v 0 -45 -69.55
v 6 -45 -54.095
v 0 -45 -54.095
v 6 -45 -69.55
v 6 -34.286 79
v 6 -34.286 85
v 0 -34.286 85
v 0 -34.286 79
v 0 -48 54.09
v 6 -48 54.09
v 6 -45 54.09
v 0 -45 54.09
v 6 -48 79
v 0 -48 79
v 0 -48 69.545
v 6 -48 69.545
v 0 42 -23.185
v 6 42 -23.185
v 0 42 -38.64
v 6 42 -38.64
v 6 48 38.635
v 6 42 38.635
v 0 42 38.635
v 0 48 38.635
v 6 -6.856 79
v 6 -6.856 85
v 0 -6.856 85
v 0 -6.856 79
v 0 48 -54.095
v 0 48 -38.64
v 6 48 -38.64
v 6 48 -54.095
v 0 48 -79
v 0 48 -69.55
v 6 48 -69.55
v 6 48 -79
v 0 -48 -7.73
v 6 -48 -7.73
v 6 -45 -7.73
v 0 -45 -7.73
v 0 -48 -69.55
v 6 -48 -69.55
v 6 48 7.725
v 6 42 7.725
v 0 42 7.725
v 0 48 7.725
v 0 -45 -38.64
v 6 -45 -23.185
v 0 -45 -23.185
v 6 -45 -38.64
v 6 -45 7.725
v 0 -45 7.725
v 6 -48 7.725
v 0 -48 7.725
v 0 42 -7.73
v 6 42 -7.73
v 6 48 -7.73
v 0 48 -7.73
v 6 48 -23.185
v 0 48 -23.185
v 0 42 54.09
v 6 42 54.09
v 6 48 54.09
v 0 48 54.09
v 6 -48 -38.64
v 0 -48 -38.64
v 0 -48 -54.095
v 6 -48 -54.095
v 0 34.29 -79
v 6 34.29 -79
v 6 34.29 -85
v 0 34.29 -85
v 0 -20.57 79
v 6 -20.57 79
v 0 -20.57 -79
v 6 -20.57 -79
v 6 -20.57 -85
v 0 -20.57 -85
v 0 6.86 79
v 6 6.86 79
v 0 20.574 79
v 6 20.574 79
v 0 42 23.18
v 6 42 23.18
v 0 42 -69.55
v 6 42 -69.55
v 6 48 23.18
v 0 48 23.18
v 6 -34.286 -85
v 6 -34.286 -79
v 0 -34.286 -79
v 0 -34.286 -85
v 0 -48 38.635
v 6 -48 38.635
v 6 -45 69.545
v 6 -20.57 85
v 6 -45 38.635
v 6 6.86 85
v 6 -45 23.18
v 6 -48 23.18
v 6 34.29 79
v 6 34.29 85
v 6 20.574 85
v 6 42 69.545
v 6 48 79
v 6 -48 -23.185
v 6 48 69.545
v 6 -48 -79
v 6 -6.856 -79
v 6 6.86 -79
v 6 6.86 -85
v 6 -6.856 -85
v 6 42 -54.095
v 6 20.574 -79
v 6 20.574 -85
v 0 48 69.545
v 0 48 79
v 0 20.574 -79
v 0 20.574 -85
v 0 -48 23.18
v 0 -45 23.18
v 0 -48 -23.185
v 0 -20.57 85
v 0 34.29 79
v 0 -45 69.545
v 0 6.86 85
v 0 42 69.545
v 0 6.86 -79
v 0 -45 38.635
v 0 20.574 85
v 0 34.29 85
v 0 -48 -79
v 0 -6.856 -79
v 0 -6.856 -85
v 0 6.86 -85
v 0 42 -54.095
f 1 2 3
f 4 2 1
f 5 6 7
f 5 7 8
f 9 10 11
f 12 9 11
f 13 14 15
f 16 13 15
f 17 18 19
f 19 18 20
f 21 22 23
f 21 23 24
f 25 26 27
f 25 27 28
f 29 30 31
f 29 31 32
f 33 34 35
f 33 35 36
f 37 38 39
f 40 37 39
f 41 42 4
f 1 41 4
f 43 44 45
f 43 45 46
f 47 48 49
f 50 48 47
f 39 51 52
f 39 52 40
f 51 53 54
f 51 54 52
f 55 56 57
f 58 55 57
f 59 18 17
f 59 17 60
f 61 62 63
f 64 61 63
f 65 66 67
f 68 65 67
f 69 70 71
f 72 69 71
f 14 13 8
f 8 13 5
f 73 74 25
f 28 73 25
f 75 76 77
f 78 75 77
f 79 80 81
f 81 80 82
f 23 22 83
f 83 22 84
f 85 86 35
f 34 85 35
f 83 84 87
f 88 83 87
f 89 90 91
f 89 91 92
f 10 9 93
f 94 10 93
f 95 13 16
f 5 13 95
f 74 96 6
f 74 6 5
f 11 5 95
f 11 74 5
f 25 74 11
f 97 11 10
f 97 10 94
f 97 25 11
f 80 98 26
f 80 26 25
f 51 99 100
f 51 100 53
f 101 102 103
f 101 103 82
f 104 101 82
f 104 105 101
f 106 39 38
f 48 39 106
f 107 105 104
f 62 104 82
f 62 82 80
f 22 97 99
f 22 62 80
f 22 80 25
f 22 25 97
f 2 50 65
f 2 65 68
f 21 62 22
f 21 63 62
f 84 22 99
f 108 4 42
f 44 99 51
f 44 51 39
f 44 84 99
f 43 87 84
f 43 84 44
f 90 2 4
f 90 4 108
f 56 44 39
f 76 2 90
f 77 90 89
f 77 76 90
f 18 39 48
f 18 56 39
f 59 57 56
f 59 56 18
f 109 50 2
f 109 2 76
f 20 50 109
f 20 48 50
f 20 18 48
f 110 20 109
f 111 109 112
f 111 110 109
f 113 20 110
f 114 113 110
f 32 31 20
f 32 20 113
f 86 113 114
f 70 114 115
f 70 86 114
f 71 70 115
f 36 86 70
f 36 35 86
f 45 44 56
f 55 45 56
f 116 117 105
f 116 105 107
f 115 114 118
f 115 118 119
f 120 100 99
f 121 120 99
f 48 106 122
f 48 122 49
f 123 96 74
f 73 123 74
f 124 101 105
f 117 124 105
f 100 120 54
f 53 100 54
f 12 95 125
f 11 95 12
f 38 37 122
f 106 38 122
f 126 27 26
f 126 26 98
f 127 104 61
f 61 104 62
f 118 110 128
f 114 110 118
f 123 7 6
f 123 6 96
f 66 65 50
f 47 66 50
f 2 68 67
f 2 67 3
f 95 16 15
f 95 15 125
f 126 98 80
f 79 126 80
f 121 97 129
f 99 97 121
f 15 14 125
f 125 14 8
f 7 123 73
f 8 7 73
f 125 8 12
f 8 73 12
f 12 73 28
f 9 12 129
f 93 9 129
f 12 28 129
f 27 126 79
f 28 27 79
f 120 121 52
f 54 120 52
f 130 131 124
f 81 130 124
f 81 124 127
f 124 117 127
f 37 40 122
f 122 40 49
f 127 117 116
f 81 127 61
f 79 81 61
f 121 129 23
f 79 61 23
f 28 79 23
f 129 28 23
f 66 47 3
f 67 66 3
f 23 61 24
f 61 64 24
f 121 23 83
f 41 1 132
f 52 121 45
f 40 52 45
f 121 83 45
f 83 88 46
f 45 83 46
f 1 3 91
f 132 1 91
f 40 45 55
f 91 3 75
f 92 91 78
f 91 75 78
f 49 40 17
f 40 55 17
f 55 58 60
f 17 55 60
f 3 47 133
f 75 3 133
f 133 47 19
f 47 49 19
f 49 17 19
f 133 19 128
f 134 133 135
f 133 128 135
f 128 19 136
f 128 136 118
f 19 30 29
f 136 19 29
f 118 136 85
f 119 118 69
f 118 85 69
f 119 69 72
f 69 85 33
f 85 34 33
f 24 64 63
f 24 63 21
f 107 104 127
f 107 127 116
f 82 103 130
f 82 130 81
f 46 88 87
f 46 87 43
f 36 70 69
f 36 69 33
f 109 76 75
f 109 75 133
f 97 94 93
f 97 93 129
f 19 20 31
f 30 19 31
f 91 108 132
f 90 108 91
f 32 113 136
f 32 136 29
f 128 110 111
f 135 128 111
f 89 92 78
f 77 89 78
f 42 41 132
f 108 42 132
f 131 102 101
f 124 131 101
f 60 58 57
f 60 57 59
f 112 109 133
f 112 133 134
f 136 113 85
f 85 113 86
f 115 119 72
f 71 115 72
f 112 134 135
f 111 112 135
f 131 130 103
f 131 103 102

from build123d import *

# Parameters (mm, degrees)
ESBO_O1_W                = 170
ESBO_O1_H                = 96
RESSALTO_EXTRUS_O1_DEPTH = 6
CORTE_EXTRUS_O1_REACH    = 99.801
ESBO_O2_W                = 15.455454545
ESBO_O2_H                = 6
CORTE_EXTRUS_O2_REACH    = 99.801
ESBO_O3_W                = 6
ESBO_O3_H                = 13.714285714


with BuildPart() as part:
    # Esboço1 → Ressalto-extrusão1 (new body)
    with BuildSketch(Plane(origin=(0, 0, 0), x_dir=(0, 0, -1), z_dir=(1, 0, 0))):
        Rectangle(ESBO_O1_W, ESBO_O1_H)
    extrude(amount=RESSALTO_EXTRUS_O1_DEPTH)

    # Esboço2 → Corte-extrusão1 (cut, up to next)
    with BuildSketch(Plane(origin=(6, 0, 0), x_dir=(0, 0, -1), z_dir=(1, 0, 0)), mode=Mode.PRIVATE) as corte_extrus_o1_sk1:
        with Locations((0.002272727, 45)):
            Rectangle(ESBO_O2_W, ESBO_O2_H)
    corte_extrus_o1_tool1 = extrude(corte_extrus_o1_sk1.sketch, amount=-CORTE_EXTRUS_O1_REACH, mode=Mode.PRIVATE) & part.part
    # Esboço2 → Corte-extrusão1 (cut, up to next)
    with BuildSketch(Plane(origin=(6, 0, 0), x_dir=(0, 0, -1), z_dir=(1, 0, 0)), mode=Mode.PRIVATE) as corte_extrus_o1_sk2:
        with Locations((-30.907727273, 45)):
            Rectangle(ESBO_O2_W, ESBO_O2_H)
    corte_extrus_o1_tool2 = extrude(corte_extrus_o1_sk2.sketch, amount=-CORTE_EXTRUS_O1_REACH, mode=Mode.PRIVATE) & part.part
    # Esboço2 → Corte-extrusão1 (cut, up to next)
    with BuildSketch(Plane(origin=(6, 0, 0), x_dir=(0, 0, -1), z_dir=(1, 0, 0)), mode=Mode.PRIVATE) as corte_extrus_o1_sk3:
        with Locations((-61.817727273, 45)):
            Rectangle(ESBO_O2_W, ESBO_O2_H)
    corte_extrus_o1_tool3 = extrude(corte_extrus_o1_sk3.sketch, amount=-CORTE_EXTRUS_O1_REACH, mode=Mode.PRIVATE) & part.part
    # Esboço2 → Corte-extrusão1 (cut, up to next)
    with BuildSketch(Plane(origin=(6, 0, 0), x_dir=(0, 0, -1), z_dir=(1, 0, 0)), mode=Mode.PRIVATE) as corte_extrus_o1_sk4:
        with Locations((30.912272728, 45)):
            Rectangle(ESBO_O2_W, ESBO_O2_H)
    corte_extrus_o1_tool4 = extrude(corte_extrus_o1_sk4.sketch, amount=-CORTE_EXTRUS_O1_REACH, mode=Mode.PRIVATE) & part.part
    # Esboço2 → Corte-extrusão1 (cut, up to next)
    with BuildSketch(Plane(origin=(6, 0, 0), x_dir=(0, 0, -1), z_dir=(1, 0, 0)), mode=Mode.PRIVATE) as corte_extrus_o1_sk5:
        with Locations((61.822272728, 45)):
            Rectangle(ESBO_O2_W, ESBO_O2_H)
    corte_extrus_o1_tool5 = extrude(corte_extrus_o1_sk5.sketch, amount=-CORTE_EXTRUS_O1_REACH, mode=Mode.PRIVATE) & part.part
    # Esboço2 → Corte-extrusão1 (cut, up to next)
    with BuildSketch(Plane(origin=(6, 0, 0), x_dir=(0, 0, -1), z_dir=(1, 0, 0)), mode=Mode.PRIVATE) as corte_extrus_o1_sk6:
        with Locations((-61.817727273, -48)):
            Rectangle(ESBO_O2_W, ESBO_O2_H)
    corte_extrus_o1_tool6 = extrude(corte_extrus_o1_sk6.sketch, amount=-CORTE_EXTRUS_O1_REACH, mode=Mode.PRIVATE) & part.part
    # Esboço2 → Corte-extrusão1 (cut, up to next)
    with BuildSketch(Plane(origin=(6, 0, 0), x_dir=(0, 0, -1), z_dir=(1, 0, 0)), mode=Mode.PRIVATE) as corte_extrus_o1_sk7:
        with Locations((-30.907727273, -48)):
            Rectangle(ESBO_O2_W, ESBO_O2_H)
    corte_extrus_o1_tool7 = extrude(corte_extrus_o1_sk7.sketch, amount=-CORTE_EXTRUS_O1_REACH, mode=Mode.PRIVATE) & part.part
    # Esboço2 → Corte-extrusão1 (cut, up to next)
    with BuildSketch(Plane(origin=(6, 0, 0), x_dir=(0, 0, -1), z_dir=(1, 0, 0)), mode=Mode.PRIVATE) as corte_extrus_o1_sk8:
        with Locations((0.002272727, -48)):
            Rectangle(ESBO_O2_W, ESBO_O2_H)
    corte_extrus_o1_tool8 = extrude(corte_extrus_o1_sk8.sketch, amount=-CORTE_EXTRUS_O1_REACH, mode=Mode.PRIVATE) & part.part
    # Esboço2 → Corte-extrusão1 (cut, up to next)
    with BuildSketch(Plane(origin=(6, 0, 0), x_dir=(0, 0, -1), z_dir=(1, 0, 0)), mode=Mode.PRIVATE) as corte_extrus_o1_sk9:
        with Locations((30.912272728, -48)):
            Rectangle(ESBO_O2_W, ESBO_O2_H)
    corte_extrus_o1_tool9 = extrude(corte_extrus_o1_sk9.sketch, amount=-CORTE_EXTRUS_O1_REACH, mode=Mode.PRIVATE) & part.part
    # Esboço2 → Corte-extrusão1 (cut, up to next)
    with BuildSketch(Plane(origin=(6, 0, 0), x_dir=(0, 0, -1), z_dir=(1, 0, 0)), mode=Mode.PRIVATE) as corte_extrus_o1_sk10:
        with Locations((61.822272728, -48)):
            Rectangle(ESBO_O2_W, ESBO_O2_H)
    corte_extrus_o1_tool10 = extrude(corte_extrus_o1_sk10.sketch, amount=-CORTE_EXTRUS_O1_REACH, mode=Mode.PRIVATE) & part.part
    add(corte_extrus_o1_tool1.solids().sort_by_distance((6, 45, -0.002273))[0], mode=Mode.SUBTRACT)
    add(corte_extrus_o1_tool2.solids().sort_by_distance((6, 45, 30.907727))[0], mode=Mode.SUBTRACT)
    add(corte_extrus_o1_tool3.solids().sort_by_distance((6, 45, 61.817727))[0], mode=Mode.SUBTRACT)
    add(corte_extrus_o1_tool4.solids().sort_by_distance((6, 45, -30.912273))[0], mode=Mode.SUBTRACT)
    add(corte_extrus_o1_tool5.solids().sort_by_distance((6, 45, -61.822273))[0], mode=Mode.SUBTRACT)
    add(corte_extrus_o1_tool6.solids().sort_by_distance((6, -48, 61.817727))[0], mode=Mode.SUBTRACT)
    add(corte_extrus_o1_tool7.solids().sort_by_distance((6, -48, 30.907727))[0], mode=Mode.SUBTRACT)
    add(corte_extrus_o1_tool8.solids().sort_by_distance((6, -48, -0.002273))[0], mode=Mode.SUBTRACT)
    add(corte_extrus_o1_tool9.solids().sort_by_distance((6, -48, -30.912273))[0], mode=Mode.SUBTRACT)
    add(corte_extrus_o1_tool10.solids().sort_by_distance((6, -48, -61.822273))[0], mode=Mode.SUBTRACT)

    # Esboço3 → Corte-extrusão2 (cut, up to next)
    with BuildSketch(Plane(origin=(6, 0, 0), x_dir=(0, 0, -1), z_dir=(1, 0, 0)), mode=Mode.PRIVATE) as corte_extrus_o2_sk1:
        with Locations((82, -41.142857143)):
            Rectangle(ESBO_O3_W, ESBO_O3_H)
    corte_extrus_o2_tool1 = extrude(corte_extrus_o2_sk1.sketch, amount=-CORTE_EXTRUS_O2_REACH, mode=Mode.PRIVATE) & part.part
    # Esboço3 → Corte-extrusão2 (cut, up to next)
    with BuildSketch(Plane(origin=(6, 0, 0), x_dir=(0, 0, -1), z_dir=(1, 0, 0)), mode=Mode.PRIVATE) as corte_extrus_o2_sk2:
        with Locations((-82, -41.142857143)):
            Rectangle(ESBO_O3_W, ESBO_O3_H)
    corte_extrus_o2_tool2 = extrude(corte_extrus_o2_sk2.sketch, amount=-CORTE_EXTRUS_O2_REACH, mode=Mode.PRIVATE) & part.part
    # Esboço3 → Corte-extrusão2 (cut, up to next)
    with BuildSketch(Plane(origin=(6, 0, 0), x_dir=(0, 0, -1), z_dir=(1, 0, 0)), mode=Mode.PRIVATE) as corte_extrus_o2_sk3:
        with Locations((82, -13.712857143)):
            Rectangle(ESBO_O3_W, ESBO_O3_H)
    corte_extrus_o2_tool3 = extrude(corte_extrus_o2_sk3.sketch, amount=-CORTE_EXTRUS_O2_REACH, mode=Mode.PRIVATE) & part.part
    # Esboço3 → Corte-extrusão2 (cut, up to next)
    with BuildSketch(Plane(origin=(6, 0, 0), x_dir=(0, 0, -1), z_dir=(1, 0, 0)), mode=Mode.PRIVATE) as corte_extrus_o2_sk4:
        with Locations((82, 13.717142857)):
            Rectangle(ESBO_O3_W, ESBO_O3_H)
    corte_extrus_o2_tool4 = extrude(corte_extrus_o2_sk4.sketch, amount=-CORTE_EXTRUS_O2_REACH, mode=Mode.PRIVATE) & part.part
    # Esboço3 → Corte-extrusão2 (cut, up to next)
    with BuildSketch(Plane(origin=(6, 0, 0), x_dir=(0, 0, -1), z_dir=(1, 0, 0)), mode=Mode.PRIVATE) as corte_extrus_o2_sk5:
        with Locations((82, 41.147142857)):
            Rectangle(ESBO_O3_W, ESBO_O3_H)
    corte_extrus_o2_tool5 = extrude(corte_extrus_o2_sk5.sketch, amount=-CORTE_EXTRUS_O2_REACH, mode=Mode.PRIVATE) & part.part
    # Esboço3 → Corte-extrusão2 (cut, up to next)
    with BuildSketch(Plane(origin=(6, 0, 0), x_dir=(0, 0, -1), z_dir=(1, 0, 0)), mode=Mode.PRIVATE) as corte_extrus_o2_sk6:
        with Locations((-82, -13.712857143)):
            Rectangle(ESBO_O3_W, ESBO_O3_H)
    corte_extrus_o2_tool6 = extrude(corte_extrus_o2_sk6.sketch, amount=-CORTE_EXTRUS_O2_REACH, mode=Mode.PRIVATE) & part.part
    # Esboço3 → Corte-extrusão2 (cut, up to next)
    with BuildSketch(Plane(origin=(6, 0, 0), x_dir=(0, 0, -1), z_dir=(1, 0, 0)), mode=Mode.PRIVATE) as corte_extrus_o2_sk7:
        with Locations((-82, 13.717142857)):
            Rectangle(ESBO_O3_W, ESBO_O3_H)
    corte_extrus_o2_tool7 = extrude(corte_extrus_o2_sk7.sketch, amount=-CORTE_EXTRUS_O2_REACH, mode=Mode.PRIVATE) & part.part
    # Esboço3 → Corte-extrusão2 (cut, up to next)
    with BuildSketch(Plane(origin=(6, 0, 0), x_dir=(0, 0, -1), z_dir=(1, 0, 0)), mode=Mode.PRIVATE) as corte_extrus_o2_sk8:
        with Locations((-82, 41.147142857)):
            Rectangle(ESBO_O3_W, ESBO_O3_H)
    corte_extrus_o2_tool8 = extrude(corte_extrus_o2_sk8.sketch, amount=-CORTE_EXTRUS_O2_REACH, mode=Mode.PRIVATE) & part.part
    add(corte_extrus_o2_tool1.solids().sort_by_distance((6, -41.142857, -82))[0], mode=Mode.SUBTRACT)
    add(corte_extrus_o2_tool2.solids().sort_by_distance((6, -41.142857, 82))[0], mode=Mode.SUBTRACT)
    add(corte_extrus_o2_tool3.solids().sort_by_distance((6, -13.712857, -82))[0], mode=Mode.SUBTRACT)
    add(corte_extrus_o2_tool4.solids().sort_by_distance((6, 13.717143, -82))[0], mode=Mode.SUBTRACT)
    add(corte_extrus_o2_tool5.solids().sort_by_distance((6, 41.147143, -82))[0], mode=Mode.SUBTRACT)
    add(corte_extrus_o2_tool6.solids().sort_by_distance((6, -13.712857, 82))[0], mode=Mode.SUBTRACT)
    add(corte_extrus_o2_tool7.solids().sort_by_distance((6, 13.717143, 82))[0], mode=Mode.SUBTRACT)
    add(corte_extrus_o2_tool8.solids().sort_by_distance((6, 41.147143, 82))[0], mode=Mode.SUBTRACT)


solid = part.part
